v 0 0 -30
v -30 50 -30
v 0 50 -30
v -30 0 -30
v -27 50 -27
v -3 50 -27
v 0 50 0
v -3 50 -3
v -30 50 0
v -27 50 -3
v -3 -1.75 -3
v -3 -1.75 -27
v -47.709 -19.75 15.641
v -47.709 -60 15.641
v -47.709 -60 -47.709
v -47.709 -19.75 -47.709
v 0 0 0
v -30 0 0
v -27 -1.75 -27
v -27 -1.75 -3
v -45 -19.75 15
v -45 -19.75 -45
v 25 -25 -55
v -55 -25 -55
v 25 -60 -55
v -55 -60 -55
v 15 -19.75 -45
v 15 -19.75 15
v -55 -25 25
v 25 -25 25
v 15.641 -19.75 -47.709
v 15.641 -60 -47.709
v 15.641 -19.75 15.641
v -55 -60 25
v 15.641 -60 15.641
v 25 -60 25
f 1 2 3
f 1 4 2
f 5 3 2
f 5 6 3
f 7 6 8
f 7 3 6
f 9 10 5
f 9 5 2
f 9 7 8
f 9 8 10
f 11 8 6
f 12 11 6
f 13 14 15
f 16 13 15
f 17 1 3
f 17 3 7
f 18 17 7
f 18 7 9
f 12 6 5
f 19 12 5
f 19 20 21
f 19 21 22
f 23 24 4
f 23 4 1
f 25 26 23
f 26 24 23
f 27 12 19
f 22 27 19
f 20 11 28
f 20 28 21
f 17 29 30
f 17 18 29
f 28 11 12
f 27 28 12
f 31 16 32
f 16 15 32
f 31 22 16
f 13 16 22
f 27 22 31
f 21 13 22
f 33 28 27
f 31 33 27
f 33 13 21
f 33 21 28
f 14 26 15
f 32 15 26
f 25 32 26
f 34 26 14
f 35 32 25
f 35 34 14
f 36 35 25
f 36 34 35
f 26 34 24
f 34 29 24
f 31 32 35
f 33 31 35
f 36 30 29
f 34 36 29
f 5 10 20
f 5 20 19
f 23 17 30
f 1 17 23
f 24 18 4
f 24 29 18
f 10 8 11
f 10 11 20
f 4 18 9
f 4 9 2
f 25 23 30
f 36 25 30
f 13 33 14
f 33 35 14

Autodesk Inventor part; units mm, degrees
ref_plane "YZ Plane" through (0, 0, 0) normal (1, 0, 0) x (0, 1, 0)
ref_plane "XZ Plane" through (0, 0, 0) normal (0, 1, 0) x (-1, 0, 0)
ref_plane "XY Plane" through (0, 0, 0) normal (0, 0, 1) x (1, 0, 0)
sketch "Boceto1" plane through (0, 0, 0) normal (0, 1, 0) x (-1, 0, 0)
  line L0 (0, 0) -> (30, 0)
  line L1 (30, 0) -> (30, -30)
  line L2 (30, -30) -> (0, -30)
  line L3 (0, -30) -> (0, 0)
  dimension "d0" = 30
  dimension "d1" = 30
extrude "Extrusión1" add sketch "Boceto1" along normal blind 50
sketch "Boceto2" plane through (0, 50, 0) normal (0, 1, 0) x (1, 0, 0)
  line L0 (-30, 0) -> (0, 0) projected
  line L1 (0, 0) -> (-3, 0)
  line L2 (-3, 0) -> (-6, 0)
  line L3 (-3, 0) -> (-3, 3)
  line L4 (-30, 30) -> (-30, 0) projected
  line L5 (-30, 30) -> (-27, 30)
  line L6 (0, 30) -> (-30, 30) projected
  line L7 (-27, 30) -> (-30, 30)
  line L8 (-27, 30) -> (-27, 27)
  line L9 (-3, 3) -> (-27, 3)
  line L10 (-27, 3) -> (-27, 27)
  line L11 (-27, 27) -> (-3, 27)
  line L12 (-3, 27) -> (-3, 3)
  dimension "d4" = 3
  dimension "d6" = 3
  dimension "d7" = 3
  dimension "d8" = 3
  dimension "d9" = 3
extrude "Extrusión2" cut sketch "Boceto2" against normal blind 184.25 contours L9 L10 L11 L12
sketch "Boceto3" plane through (0, 0, 0) normal (1, 0, 0) x (0, 0, -1)
  point P0 (0, 0)
sketch "Boceto4" plane through (0, 0, 0) normal (0, -1, 0) x (1, 0, 0)
  line L0 (25, 25) -> (-55, 25)
  line L1 (-55, 25) -> (-55, -55)
  line L2 (-55, -55) -> (25, -55)
  line L3 (25, -55) -> (25, 25)
  line L4 (25, -55) -> (25, -15)
  line L5 (25, -15) -> (-15, -15)
  line L6 (0, 0) -> (0, -30) projected
  line L7 (0, 0) -> (0, -15)
  line L8 (0, -15) -> (-15, -15)
  dimension "d12" = 80
  dimension "d13" = 80
  dimension "d14" = 40
  dimension "d15" = 40
  dimension "d16" = 15
  dimension "d17" = 15
extrude "Extrusión3" add sketch "Boceto4" along normal blind 60
chamfer "Chaflán1" distance 25 angle 45 1 edges at (-55, 0, -15)
chamfer "Chaflán2" distance 25 angle 45 1 edges at (-2.5003, 0, 25)
chamfer "Chaflán3" distance 25 angle 45 1 edges at (-2.5003, 0, -55)
chamfer "Chaflán4" distance 25 angle 45 1 edges at (25, 0, -15)
sketch "Boceto6" plane through (0, -60, 0) normal (0, -1, 0) x (1, 0, 0)
  line L0 (0, 0) -> (25, 25) projected
  line L1 (-55, -55) -> (-30, -30) projected
  line L2 (15.6406, 15.6406) -> (-47.7087, 15.6406)
  line L3 (-47.7087, 15.6406) -> (-47.7087, -47.7087)
  line L4 (-47.7087, -47.7087) -> (15.6406, -47.7087)
  line L5 (15.6406, -47.7087) -> (15.6406, 15.6406)
extrude "Extrusión5" cut sketch "Boceto6" against normal blind 40.25
sketch "Boceto7" plane through (0, 0, 0) normal (0, 1, 0) x (1, 0, 0)
  line L0 (-3, 27) -> (-27, 27) projected
  line L1 (-3, 3) -> (-3, 27) projected
  line L2 (-27, 27) -> (-3, 27)
  line L3 (-3, 27) -> (-3, 3)
  line L4 (-3, 3) -> (-27, 3)
  line L5 (-27, 3) -> (-27, 27)
  point P0 (0, 0)
extrude "Extrusión6" cut sketch "Boceto7" against normal blind 184.25
chamfer "Chaflán5" distance 18 angle 45 4 edges at (-27, -19.75, -15) (-15, -19.75, -3) (-15, -19.75, -27) (-3, -19.75, -15)
properties part number "tolva"
